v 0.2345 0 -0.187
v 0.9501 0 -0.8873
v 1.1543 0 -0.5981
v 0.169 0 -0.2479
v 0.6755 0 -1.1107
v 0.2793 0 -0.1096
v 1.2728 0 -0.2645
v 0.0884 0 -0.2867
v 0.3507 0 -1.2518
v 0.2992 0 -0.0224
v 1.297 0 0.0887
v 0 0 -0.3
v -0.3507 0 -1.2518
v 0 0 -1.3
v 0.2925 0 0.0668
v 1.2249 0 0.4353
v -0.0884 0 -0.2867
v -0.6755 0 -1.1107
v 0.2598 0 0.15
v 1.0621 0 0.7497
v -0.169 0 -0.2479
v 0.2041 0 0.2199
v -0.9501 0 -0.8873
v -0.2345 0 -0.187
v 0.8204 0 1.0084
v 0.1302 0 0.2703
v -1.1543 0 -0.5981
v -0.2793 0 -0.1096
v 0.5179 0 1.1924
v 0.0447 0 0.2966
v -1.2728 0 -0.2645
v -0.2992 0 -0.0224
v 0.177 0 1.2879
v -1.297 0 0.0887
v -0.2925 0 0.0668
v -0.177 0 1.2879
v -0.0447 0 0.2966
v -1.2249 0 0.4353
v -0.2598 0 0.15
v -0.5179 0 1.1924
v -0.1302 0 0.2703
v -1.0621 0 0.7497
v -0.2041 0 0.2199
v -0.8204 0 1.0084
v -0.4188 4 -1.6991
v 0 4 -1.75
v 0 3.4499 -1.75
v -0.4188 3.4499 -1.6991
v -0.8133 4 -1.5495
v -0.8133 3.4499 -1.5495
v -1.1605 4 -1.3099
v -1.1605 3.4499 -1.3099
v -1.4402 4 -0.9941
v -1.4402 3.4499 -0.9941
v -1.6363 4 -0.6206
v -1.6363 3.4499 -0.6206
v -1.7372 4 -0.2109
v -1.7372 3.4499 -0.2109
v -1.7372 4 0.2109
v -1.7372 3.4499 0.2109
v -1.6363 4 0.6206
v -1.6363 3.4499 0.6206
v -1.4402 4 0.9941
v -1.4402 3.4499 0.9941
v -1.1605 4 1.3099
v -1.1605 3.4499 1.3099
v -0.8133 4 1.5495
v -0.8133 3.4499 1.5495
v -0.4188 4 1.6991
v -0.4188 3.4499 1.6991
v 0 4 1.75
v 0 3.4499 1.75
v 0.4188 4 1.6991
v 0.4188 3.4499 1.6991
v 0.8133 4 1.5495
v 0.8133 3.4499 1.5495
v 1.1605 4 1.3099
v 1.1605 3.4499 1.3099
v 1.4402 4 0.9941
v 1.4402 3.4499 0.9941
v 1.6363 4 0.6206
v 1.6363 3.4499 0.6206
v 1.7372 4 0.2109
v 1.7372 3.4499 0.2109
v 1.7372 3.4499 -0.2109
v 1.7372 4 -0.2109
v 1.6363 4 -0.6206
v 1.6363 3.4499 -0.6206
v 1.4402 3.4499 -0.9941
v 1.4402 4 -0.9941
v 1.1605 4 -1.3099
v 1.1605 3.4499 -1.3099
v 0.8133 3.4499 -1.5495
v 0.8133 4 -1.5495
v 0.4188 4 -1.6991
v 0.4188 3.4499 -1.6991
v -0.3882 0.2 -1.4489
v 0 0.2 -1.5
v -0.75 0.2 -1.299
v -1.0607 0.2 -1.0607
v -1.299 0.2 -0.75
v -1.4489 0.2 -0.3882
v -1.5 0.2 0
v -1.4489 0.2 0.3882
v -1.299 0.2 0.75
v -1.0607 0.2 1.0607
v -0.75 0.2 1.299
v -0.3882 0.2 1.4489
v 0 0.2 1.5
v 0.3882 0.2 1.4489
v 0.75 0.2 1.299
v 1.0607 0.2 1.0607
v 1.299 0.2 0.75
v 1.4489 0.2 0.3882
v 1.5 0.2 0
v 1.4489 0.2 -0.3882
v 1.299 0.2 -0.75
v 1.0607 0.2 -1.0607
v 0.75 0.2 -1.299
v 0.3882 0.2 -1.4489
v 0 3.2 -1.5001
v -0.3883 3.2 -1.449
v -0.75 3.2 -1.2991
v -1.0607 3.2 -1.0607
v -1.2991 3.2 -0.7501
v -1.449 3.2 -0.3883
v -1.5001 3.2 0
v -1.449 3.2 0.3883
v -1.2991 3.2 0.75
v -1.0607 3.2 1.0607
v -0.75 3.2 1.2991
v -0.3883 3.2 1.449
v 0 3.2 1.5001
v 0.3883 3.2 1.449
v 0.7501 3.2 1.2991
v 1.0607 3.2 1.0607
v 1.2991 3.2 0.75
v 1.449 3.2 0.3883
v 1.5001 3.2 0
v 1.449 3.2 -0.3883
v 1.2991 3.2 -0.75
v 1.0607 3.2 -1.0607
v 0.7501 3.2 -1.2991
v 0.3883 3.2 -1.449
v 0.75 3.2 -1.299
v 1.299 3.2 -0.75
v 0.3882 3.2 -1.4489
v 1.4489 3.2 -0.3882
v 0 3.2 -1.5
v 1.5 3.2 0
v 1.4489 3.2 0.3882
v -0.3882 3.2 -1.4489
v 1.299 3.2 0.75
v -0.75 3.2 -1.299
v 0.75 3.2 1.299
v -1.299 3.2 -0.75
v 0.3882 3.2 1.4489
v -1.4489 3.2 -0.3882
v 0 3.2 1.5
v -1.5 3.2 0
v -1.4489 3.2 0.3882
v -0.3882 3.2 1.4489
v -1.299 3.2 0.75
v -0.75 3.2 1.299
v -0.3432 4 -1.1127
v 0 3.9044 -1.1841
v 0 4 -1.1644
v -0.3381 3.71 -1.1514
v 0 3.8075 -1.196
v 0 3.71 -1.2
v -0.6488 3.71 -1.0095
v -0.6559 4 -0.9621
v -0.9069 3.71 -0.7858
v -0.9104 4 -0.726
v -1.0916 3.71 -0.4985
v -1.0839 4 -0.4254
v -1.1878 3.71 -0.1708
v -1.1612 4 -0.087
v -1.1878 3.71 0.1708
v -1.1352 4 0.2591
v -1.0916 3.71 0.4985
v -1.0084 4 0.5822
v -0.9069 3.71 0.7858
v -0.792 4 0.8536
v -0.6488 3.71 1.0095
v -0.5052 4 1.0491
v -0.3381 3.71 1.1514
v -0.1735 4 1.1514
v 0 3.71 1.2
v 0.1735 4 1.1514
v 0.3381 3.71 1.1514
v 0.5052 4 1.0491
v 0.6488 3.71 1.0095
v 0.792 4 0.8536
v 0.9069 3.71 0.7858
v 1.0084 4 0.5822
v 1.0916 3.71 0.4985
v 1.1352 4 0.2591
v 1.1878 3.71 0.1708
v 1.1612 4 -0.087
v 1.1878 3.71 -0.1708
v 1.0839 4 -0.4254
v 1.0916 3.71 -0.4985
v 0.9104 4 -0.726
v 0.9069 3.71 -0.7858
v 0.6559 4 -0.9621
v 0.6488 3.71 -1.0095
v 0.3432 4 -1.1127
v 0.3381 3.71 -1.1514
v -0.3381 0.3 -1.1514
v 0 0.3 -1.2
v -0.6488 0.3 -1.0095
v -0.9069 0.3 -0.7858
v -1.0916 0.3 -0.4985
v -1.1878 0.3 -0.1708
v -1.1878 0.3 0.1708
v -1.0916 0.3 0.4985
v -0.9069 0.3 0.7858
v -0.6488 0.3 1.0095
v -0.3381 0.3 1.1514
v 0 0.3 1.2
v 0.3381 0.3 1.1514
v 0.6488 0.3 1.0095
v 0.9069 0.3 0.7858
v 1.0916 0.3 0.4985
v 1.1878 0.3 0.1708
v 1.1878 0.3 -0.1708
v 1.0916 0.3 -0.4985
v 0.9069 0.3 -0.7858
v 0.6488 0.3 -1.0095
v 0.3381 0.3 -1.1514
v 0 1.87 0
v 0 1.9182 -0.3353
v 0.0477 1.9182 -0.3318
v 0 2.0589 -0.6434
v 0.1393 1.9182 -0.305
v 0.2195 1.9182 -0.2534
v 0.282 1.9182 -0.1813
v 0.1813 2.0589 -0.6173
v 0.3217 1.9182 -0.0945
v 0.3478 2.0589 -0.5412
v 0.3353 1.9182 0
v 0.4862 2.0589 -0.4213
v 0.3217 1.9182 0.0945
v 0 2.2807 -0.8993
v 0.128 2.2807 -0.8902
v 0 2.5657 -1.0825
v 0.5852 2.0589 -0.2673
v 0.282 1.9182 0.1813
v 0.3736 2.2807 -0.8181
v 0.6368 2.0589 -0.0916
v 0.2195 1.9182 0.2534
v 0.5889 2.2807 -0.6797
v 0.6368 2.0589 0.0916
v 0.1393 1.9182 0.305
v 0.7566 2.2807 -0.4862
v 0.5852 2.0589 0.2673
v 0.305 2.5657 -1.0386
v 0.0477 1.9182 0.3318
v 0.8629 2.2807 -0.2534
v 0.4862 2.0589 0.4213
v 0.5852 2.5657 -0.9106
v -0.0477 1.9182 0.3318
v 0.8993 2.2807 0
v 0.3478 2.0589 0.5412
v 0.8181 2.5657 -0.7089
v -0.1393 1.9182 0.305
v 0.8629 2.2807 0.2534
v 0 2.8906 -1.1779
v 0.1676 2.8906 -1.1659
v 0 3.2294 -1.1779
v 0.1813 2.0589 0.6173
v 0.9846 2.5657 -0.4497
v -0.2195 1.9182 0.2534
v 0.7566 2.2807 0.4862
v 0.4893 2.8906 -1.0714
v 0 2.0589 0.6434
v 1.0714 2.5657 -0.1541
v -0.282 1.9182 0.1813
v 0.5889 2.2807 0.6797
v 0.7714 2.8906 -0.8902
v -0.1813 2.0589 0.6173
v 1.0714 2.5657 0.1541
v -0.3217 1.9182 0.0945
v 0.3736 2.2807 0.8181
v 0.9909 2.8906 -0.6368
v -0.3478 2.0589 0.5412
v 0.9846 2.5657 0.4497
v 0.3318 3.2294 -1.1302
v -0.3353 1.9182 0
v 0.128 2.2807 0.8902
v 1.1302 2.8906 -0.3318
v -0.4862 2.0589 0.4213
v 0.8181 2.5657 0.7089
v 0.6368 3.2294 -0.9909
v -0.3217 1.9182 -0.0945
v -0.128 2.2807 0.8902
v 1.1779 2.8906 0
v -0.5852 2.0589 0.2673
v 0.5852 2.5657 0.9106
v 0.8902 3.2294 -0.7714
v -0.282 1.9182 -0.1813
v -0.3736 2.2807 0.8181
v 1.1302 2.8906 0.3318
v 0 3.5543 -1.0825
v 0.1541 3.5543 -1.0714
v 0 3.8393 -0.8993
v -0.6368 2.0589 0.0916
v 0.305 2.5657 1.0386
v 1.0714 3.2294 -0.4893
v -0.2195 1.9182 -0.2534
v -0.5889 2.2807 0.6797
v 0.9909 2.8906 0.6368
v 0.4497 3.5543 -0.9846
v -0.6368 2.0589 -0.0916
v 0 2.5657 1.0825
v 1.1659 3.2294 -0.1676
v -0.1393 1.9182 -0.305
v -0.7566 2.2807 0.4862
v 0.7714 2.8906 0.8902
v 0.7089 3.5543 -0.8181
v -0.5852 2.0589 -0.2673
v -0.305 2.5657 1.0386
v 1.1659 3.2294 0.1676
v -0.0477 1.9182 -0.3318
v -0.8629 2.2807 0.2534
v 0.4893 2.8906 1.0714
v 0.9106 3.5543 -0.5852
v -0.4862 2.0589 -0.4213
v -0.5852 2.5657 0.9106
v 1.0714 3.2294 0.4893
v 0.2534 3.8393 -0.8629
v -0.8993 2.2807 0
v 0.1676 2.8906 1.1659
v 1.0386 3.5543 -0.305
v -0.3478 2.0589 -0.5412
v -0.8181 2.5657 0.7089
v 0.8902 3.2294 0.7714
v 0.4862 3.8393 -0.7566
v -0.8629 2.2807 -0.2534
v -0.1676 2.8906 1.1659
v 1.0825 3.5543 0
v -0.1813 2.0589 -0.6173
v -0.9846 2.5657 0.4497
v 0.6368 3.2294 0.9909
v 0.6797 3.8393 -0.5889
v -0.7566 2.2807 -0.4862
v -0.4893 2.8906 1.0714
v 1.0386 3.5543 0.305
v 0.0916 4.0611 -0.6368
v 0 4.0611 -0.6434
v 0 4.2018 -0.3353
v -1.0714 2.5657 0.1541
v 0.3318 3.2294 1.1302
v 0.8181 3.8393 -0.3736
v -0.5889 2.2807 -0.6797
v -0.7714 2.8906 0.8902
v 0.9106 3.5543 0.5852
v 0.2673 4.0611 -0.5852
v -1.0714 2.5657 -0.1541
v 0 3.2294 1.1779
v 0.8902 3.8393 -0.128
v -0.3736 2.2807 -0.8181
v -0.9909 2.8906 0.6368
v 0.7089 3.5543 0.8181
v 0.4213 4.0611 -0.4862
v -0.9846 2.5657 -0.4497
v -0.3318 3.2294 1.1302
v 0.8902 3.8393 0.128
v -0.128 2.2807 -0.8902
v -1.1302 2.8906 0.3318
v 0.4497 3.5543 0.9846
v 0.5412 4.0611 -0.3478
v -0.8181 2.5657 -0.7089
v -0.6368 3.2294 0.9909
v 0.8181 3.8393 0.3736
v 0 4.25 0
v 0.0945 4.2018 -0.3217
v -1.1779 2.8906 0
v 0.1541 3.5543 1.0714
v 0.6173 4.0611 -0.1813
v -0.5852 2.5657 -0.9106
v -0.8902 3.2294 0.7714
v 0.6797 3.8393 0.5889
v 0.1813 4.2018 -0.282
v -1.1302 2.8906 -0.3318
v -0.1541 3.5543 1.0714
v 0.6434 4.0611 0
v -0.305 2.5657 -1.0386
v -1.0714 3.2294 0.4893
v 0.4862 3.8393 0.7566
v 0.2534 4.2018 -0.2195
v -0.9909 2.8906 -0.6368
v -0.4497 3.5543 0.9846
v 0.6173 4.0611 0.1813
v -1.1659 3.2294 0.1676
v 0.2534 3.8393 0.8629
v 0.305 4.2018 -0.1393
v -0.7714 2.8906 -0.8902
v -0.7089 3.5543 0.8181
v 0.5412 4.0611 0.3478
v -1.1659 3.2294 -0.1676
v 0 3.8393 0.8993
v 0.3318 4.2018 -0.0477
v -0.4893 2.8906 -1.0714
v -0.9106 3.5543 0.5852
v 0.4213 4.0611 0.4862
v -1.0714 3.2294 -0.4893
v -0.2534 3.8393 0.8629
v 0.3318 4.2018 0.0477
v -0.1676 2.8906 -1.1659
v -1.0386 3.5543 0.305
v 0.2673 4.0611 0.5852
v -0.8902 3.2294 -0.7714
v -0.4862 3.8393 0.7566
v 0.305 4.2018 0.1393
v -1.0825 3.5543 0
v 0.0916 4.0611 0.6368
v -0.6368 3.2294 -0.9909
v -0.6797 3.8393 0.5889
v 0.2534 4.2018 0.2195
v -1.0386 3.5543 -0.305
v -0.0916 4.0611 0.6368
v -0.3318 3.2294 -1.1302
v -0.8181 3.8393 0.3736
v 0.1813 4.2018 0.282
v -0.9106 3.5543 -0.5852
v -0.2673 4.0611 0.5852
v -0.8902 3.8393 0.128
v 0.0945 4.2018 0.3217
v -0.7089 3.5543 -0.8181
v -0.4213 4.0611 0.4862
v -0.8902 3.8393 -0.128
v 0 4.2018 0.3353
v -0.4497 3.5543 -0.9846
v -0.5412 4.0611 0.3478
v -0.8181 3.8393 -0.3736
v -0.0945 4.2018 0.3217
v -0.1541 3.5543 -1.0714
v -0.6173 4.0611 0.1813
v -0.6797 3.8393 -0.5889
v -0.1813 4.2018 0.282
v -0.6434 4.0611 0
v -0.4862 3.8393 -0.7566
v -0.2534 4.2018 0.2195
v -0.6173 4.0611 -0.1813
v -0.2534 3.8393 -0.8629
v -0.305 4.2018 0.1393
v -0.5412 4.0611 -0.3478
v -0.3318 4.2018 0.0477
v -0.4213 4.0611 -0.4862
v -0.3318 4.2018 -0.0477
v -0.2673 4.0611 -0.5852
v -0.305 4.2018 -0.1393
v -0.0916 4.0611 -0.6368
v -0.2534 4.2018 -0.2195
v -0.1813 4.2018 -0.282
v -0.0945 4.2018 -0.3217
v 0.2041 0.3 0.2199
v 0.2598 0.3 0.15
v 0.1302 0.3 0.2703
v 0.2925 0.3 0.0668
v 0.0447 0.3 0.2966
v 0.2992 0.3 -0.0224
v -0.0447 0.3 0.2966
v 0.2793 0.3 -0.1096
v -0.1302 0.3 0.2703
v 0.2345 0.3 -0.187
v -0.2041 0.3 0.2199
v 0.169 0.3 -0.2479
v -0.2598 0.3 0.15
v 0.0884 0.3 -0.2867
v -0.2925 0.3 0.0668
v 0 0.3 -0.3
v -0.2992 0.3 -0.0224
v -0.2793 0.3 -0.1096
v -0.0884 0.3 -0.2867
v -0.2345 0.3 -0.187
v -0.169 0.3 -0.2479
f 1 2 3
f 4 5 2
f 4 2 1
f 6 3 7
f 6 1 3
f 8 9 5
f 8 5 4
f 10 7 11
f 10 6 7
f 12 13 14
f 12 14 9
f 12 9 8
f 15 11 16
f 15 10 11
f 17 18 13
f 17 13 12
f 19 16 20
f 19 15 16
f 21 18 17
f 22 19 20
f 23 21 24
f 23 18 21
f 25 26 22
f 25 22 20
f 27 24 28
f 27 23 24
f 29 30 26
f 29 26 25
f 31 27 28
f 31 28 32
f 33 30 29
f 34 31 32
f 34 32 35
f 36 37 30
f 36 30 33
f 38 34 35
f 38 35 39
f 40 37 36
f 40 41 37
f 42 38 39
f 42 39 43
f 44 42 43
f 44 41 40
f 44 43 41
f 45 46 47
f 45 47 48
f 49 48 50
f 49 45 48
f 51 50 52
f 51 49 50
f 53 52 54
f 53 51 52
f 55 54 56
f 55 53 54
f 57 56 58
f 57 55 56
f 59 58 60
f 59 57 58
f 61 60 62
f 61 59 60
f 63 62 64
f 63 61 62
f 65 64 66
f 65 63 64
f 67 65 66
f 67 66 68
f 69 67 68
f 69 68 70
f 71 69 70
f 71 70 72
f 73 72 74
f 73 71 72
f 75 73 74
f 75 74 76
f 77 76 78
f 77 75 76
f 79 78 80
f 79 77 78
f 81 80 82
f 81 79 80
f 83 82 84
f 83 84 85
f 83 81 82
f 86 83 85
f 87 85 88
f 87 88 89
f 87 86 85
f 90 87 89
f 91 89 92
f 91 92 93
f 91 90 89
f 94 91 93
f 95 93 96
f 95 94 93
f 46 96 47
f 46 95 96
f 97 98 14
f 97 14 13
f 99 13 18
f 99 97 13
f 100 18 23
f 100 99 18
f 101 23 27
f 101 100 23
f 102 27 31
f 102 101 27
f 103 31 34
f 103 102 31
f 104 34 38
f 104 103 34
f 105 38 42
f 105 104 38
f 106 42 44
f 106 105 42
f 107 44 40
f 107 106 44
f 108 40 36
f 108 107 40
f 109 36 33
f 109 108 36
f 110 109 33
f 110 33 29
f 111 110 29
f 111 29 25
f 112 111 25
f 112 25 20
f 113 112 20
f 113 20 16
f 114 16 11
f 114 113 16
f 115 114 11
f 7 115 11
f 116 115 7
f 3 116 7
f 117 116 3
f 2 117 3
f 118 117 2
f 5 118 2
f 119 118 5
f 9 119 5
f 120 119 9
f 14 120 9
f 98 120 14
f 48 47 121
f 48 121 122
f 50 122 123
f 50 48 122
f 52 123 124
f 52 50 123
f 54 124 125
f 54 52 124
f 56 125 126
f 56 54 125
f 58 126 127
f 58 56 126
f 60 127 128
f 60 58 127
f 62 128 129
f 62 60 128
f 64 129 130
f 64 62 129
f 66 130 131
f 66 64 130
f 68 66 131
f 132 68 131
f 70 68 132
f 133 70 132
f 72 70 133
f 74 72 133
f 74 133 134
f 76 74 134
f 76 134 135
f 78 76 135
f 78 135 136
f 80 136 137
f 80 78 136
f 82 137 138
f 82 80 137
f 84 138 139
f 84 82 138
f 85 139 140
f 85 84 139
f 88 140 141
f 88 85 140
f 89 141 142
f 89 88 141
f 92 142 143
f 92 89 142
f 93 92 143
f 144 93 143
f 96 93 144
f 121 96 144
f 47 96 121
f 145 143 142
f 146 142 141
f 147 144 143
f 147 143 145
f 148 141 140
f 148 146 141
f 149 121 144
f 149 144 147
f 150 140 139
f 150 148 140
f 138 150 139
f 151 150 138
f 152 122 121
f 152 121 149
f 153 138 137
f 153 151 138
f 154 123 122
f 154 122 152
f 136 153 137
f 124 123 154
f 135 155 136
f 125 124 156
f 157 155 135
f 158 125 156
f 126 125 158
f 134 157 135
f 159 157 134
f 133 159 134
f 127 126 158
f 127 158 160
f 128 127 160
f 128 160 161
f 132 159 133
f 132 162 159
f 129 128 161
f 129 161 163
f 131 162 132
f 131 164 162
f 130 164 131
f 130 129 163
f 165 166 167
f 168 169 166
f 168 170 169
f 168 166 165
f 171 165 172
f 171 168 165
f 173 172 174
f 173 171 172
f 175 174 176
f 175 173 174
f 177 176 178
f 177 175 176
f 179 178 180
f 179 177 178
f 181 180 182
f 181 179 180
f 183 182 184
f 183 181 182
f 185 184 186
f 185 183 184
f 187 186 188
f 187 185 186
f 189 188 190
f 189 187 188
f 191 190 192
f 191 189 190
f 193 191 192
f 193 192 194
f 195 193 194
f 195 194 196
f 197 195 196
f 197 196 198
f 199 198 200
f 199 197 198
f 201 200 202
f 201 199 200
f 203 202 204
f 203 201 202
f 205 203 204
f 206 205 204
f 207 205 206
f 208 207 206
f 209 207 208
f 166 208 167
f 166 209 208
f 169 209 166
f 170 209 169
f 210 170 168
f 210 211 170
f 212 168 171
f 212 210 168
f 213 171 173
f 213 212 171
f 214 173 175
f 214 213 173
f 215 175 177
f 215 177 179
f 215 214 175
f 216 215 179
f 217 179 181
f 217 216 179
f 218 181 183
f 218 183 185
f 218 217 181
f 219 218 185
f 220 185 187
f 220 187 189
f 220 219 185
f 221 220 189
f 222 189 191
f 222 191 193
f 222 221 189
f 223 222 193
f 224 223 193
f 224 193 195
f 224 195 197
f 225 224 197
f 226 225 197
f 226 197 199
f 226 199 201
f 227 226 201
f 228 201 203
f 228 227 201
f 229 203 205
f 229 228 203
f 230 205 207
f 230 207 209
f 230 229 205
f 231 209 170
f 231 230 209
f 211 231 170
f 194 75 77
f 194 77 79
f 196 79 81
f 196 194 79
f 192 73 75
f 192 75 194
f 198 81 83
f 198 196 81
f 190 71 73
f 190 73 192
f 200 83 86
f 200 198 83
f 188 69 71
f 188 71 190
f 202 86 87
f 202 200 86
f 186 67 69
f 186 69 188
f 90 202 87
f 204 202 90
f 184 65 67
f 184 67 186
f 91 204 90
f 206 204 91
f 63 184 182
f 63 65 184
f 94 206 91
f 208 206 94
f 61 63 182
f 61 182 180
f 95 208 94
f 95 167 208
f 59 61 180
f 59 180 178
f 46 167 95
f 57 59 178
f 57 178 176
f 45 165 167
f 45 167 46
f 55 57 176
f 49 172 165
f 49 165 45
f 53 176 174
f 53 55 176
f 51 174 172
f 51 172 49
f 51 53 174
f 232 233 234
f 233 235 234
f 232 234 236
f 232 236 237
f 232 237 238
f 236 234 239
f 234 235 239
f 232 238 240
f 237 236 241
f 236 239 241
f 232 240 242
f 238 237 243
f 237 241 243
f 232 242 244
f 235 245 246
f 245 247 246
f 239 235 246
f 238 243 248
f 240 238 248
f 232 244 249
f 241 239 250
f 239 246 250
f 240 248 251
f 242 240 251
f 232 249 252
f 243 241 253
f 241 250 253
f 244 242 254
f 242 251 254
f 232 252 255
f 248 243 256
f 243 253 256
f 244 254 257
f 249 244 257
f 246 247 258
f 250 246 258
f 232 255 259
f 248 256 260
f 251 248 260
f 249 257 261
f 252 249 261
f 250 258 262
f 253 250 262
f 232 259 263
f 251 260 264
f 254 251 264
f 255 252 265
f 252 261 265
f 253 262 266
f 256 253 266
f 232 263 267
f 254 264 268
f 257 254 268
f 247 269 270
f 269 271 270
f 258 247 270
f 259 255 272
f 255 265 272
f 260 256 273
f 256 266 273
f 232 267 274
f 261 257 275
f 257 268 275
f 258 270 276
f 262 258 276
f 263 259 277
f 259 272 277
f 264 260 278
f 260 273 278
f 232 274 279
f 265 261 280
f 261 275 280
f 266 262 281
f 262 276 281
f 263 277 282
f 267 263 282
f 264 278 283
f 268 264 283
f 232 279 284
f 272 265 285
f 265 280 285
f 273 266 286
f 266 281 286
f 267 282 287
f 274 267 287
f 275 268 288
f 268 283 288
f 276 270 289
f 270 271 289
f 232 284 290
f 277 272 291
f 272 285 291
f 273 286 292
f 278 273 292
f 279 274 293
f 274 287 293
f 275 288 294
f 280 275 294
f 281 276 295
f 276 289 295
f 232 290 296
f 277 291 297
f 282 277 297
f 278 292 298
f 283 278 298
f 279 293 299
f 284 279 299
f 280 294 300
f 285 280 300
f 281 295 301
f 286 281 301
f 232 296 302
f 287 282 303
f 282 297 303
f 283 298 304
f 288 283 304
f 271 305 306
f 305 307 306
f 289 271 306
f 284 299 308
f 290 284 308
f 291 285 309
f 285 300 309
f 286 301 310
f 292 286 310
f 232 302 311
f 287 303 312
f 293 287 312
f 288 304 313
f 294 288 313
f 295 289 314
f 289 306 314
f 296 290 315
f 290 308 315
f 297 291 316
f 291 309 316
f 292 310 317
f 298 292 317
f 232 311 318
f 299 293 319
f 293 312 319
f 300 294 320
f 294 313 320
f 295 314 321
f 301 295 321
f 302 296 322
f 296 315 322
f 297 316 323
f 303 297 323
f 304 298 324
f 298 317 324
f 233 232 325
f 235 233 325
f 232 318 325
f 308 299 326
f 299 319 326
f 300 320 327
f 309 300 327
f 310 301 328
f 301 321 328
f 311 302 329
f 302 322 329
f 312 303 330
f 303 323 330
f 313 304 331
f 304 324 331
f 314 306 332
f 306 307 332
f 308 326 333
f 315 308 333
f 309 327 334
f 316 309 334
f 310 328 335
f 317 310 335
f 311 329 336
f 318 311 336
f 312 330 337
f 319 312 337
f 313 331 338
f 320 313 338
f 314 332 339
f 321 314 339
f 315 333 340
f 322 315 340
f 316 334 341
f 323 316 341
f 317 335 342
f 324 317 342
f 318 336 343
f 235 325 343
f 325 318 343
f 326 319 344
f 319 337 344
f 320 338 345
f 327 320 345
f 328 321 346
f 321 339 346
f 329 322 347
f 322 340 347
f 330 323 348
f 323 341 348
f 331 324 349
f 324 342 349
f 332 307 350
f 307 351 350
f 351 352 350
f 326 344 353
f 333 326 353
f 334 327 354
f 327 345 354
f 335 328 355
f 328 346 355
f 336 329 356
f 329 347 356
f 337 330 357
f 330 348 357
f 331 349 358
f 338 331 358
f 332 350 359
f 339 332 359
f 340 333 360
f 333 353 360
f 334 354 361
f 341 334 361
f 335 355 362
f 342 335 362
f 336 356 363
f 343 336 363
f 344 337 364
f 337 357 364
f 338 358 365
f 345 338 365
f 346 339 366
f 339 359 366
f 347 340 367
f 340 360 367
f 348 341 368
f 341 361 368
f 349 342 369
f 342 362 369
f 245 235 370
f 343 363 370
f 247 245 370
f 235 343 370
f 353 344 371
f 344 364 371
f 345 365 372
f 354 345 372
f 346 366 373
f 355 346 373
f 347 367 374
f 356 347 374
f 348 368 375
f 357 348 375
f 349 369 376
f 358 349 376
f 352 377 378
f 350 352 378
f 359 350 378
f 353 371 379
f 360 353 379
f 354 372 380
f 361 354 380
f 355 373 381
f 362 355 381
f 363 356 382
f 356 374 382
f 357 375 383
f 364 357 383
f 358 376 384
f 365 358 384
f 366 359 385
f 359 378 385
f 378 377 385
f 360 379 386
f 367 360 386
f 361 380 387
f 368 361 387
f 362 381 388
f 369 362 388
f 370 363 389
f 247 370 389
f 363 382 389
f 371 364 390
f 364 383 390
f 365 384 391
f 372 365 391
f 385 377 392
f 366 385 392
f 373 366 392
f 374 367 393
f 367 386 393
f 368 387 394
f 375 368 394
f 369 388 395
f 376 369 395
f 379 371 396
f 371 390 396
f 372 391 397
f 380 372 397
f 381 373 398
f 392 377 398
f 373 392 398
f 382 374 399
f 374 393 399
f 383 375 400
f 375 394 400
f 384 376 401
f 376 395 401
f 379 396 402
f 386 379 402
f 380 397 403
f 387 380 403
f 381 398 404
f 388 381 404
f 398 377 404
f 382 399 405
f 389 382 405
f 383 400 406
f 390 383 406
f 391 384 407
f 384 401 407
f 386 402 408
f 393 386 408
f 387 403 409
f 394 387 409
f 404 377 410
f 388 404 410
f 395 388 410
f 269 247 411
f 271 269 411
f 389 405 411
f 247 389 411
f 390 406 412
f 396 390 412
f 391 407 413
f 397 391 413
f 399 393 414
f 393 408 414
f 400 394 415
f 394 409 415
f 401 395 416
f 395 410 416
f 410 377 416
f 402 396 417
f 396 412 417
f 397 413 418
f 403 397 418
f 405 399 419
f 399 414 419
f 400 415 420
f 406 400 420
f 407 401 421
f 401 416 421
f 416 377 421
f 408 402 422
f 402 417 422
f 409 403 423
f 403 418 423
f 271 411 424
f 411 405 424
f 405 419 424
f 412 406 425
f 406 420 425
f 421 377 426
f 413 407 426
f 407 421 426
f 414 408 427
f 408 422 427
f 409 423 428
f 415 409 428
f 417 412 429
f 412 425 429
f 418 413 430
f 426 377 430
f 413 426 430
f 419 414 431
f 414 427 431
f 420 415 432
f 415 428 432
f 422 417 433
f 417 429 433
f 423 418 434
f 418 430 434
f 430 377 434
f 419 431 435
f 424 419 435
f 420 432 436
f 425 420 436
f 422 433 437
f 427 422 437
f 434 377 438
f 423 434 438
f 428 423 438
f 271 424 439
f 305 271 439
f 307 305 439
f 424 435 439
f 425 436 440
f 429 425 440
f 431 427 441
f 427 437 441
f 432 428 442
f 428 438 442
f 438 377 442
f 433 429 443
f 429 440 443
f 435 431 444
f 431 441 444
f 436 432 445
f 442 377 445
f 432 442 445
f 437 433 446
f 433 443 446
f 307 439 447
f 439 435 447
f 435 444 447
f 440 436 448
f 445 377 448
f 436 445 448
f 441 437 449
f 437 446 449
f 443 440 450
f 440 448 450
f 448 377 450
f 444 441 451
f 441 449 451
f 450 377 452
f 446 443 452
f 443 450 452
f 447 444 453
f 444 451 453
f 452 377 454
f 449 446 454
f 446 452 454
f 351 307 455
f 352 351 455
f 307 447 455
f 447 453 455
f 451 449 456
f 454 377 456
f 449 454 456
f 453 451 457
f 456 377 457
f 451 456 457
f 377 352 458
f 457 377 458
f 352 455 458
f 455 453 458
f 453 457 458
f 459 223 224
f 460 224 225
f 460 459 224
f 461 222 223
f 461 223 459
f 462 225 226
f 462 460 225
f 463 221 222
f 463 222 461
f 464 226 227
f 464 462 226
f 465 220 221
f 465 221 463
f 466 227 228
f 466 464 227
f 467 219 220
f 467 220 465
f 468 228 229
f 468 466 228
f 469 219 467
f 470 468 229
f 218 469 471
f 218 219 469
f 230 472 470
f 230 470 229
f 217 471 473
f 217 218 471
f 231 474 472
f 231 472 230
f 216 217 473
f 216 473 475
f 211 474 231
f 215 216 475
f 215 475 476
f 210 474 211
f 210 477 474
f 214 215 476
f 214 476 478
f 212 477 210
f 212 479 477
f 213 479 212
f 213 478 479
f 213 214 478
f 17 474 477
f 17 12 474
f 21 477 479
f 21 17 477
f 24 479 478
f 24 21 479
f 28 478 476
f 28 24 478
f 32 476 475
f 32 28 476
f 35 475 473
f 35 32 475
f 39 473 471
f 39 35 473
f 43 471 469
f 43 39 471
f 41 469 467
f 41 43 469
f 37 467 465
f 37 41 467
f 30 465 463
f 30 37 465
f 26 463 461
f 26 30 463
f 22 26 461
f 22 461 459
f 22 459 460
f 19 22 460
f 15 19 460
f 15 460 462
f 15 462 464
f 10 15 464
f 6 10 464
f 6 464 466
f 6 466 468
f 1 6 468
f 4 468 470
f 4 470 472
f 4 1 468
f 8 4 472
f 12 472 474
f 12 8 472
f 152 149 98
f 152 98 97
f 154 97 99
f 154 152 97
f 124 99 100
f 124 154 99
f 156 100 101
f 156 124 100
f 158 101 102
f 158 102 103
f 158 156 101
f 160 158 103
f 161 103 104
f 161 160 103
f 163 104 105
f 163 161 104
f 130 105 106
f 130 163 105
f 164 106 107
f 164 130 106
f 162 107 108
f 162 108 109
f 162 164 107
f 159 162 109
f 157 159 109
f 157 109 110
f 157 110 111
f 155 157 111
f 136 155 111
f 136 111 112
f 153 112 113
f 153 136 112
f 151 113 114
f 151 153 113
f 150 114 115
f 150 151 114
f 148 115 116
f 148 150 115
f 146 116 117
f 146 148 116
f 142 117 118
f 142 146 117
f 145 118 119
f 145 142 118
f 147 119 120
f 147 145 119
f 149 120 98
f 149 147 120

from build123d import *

# Parameters (mm, degrees)
CHAMFER_1_SIZE = 0.2
CHAMFER_2_SIZE = 0.25


with BuildPart() as part:
    # 草图1 → 旋转1 (revolve)
    with BuildSketch(Plane(origin=(0, 0, 0), x_dir=(0, 0, -1), z_dir=(1, 0, 0))):
        with BuildLine():
            Line((0.3, 0), (1.5, 0))
            Line((1.5, 0), (1.5, 3.2))
            Line((1.5, 3.2), (1.75, 3.2))
            Line((1.75, 3.2), (1.75, 4))
            Line((1.75, 4), (1.164431192, 4))
            ThreePointArc((1.164431192, 4), (1.191074605, 3.856086567), (1.2, 3.71))
            Line((1.2, 3.71), (1.2, 0.3))
            Line((1.2, 0.3), (0.3, 0.3))
            Line((0.3, 0.3), (0.3, 0))
        make_face()
    revolve(axis=Axis((0, 0, 0), (0, 1, 0)))

    # 倒角1
    chamfer_1_edges = [part.edges().sort_by_distance(p)[0] for p in [
        (0, 0, 1.5),
    ]]
    chamfer(chamfer_1_edges, length=CHAMFER_1_SIZE)

    # 倒角2
    chamfer_2_edges = [part.edges().sort_by_distance(p)[0] for p in [
        (0, 3.2, 1.75),
    ]]
    chamfer(chamfer_2_edges, length=CHAMFER_2_SIZE - 0.0001)  # a hair under: the kernel refuses the full size


with BuildPart() as body_2:
    # 草图2 → 旋转2 (revolve)
    with BuildSketch(Plane(origin=(0, 0, 0), x_dir=(0, 0, -1), z_dir=(1, 0, 0))):
        with BuildLine():
            Line((0, 4.25), (0, 1.87))
            ThreePointArc((0, 1.87), (1.19, 3.06), (0, 4.25))
        make_face()
    revolve(axis=Axis((0, 5.532857048, 0), (0, -1, 0)))


solid = Compound([part.part, body_2.part])
